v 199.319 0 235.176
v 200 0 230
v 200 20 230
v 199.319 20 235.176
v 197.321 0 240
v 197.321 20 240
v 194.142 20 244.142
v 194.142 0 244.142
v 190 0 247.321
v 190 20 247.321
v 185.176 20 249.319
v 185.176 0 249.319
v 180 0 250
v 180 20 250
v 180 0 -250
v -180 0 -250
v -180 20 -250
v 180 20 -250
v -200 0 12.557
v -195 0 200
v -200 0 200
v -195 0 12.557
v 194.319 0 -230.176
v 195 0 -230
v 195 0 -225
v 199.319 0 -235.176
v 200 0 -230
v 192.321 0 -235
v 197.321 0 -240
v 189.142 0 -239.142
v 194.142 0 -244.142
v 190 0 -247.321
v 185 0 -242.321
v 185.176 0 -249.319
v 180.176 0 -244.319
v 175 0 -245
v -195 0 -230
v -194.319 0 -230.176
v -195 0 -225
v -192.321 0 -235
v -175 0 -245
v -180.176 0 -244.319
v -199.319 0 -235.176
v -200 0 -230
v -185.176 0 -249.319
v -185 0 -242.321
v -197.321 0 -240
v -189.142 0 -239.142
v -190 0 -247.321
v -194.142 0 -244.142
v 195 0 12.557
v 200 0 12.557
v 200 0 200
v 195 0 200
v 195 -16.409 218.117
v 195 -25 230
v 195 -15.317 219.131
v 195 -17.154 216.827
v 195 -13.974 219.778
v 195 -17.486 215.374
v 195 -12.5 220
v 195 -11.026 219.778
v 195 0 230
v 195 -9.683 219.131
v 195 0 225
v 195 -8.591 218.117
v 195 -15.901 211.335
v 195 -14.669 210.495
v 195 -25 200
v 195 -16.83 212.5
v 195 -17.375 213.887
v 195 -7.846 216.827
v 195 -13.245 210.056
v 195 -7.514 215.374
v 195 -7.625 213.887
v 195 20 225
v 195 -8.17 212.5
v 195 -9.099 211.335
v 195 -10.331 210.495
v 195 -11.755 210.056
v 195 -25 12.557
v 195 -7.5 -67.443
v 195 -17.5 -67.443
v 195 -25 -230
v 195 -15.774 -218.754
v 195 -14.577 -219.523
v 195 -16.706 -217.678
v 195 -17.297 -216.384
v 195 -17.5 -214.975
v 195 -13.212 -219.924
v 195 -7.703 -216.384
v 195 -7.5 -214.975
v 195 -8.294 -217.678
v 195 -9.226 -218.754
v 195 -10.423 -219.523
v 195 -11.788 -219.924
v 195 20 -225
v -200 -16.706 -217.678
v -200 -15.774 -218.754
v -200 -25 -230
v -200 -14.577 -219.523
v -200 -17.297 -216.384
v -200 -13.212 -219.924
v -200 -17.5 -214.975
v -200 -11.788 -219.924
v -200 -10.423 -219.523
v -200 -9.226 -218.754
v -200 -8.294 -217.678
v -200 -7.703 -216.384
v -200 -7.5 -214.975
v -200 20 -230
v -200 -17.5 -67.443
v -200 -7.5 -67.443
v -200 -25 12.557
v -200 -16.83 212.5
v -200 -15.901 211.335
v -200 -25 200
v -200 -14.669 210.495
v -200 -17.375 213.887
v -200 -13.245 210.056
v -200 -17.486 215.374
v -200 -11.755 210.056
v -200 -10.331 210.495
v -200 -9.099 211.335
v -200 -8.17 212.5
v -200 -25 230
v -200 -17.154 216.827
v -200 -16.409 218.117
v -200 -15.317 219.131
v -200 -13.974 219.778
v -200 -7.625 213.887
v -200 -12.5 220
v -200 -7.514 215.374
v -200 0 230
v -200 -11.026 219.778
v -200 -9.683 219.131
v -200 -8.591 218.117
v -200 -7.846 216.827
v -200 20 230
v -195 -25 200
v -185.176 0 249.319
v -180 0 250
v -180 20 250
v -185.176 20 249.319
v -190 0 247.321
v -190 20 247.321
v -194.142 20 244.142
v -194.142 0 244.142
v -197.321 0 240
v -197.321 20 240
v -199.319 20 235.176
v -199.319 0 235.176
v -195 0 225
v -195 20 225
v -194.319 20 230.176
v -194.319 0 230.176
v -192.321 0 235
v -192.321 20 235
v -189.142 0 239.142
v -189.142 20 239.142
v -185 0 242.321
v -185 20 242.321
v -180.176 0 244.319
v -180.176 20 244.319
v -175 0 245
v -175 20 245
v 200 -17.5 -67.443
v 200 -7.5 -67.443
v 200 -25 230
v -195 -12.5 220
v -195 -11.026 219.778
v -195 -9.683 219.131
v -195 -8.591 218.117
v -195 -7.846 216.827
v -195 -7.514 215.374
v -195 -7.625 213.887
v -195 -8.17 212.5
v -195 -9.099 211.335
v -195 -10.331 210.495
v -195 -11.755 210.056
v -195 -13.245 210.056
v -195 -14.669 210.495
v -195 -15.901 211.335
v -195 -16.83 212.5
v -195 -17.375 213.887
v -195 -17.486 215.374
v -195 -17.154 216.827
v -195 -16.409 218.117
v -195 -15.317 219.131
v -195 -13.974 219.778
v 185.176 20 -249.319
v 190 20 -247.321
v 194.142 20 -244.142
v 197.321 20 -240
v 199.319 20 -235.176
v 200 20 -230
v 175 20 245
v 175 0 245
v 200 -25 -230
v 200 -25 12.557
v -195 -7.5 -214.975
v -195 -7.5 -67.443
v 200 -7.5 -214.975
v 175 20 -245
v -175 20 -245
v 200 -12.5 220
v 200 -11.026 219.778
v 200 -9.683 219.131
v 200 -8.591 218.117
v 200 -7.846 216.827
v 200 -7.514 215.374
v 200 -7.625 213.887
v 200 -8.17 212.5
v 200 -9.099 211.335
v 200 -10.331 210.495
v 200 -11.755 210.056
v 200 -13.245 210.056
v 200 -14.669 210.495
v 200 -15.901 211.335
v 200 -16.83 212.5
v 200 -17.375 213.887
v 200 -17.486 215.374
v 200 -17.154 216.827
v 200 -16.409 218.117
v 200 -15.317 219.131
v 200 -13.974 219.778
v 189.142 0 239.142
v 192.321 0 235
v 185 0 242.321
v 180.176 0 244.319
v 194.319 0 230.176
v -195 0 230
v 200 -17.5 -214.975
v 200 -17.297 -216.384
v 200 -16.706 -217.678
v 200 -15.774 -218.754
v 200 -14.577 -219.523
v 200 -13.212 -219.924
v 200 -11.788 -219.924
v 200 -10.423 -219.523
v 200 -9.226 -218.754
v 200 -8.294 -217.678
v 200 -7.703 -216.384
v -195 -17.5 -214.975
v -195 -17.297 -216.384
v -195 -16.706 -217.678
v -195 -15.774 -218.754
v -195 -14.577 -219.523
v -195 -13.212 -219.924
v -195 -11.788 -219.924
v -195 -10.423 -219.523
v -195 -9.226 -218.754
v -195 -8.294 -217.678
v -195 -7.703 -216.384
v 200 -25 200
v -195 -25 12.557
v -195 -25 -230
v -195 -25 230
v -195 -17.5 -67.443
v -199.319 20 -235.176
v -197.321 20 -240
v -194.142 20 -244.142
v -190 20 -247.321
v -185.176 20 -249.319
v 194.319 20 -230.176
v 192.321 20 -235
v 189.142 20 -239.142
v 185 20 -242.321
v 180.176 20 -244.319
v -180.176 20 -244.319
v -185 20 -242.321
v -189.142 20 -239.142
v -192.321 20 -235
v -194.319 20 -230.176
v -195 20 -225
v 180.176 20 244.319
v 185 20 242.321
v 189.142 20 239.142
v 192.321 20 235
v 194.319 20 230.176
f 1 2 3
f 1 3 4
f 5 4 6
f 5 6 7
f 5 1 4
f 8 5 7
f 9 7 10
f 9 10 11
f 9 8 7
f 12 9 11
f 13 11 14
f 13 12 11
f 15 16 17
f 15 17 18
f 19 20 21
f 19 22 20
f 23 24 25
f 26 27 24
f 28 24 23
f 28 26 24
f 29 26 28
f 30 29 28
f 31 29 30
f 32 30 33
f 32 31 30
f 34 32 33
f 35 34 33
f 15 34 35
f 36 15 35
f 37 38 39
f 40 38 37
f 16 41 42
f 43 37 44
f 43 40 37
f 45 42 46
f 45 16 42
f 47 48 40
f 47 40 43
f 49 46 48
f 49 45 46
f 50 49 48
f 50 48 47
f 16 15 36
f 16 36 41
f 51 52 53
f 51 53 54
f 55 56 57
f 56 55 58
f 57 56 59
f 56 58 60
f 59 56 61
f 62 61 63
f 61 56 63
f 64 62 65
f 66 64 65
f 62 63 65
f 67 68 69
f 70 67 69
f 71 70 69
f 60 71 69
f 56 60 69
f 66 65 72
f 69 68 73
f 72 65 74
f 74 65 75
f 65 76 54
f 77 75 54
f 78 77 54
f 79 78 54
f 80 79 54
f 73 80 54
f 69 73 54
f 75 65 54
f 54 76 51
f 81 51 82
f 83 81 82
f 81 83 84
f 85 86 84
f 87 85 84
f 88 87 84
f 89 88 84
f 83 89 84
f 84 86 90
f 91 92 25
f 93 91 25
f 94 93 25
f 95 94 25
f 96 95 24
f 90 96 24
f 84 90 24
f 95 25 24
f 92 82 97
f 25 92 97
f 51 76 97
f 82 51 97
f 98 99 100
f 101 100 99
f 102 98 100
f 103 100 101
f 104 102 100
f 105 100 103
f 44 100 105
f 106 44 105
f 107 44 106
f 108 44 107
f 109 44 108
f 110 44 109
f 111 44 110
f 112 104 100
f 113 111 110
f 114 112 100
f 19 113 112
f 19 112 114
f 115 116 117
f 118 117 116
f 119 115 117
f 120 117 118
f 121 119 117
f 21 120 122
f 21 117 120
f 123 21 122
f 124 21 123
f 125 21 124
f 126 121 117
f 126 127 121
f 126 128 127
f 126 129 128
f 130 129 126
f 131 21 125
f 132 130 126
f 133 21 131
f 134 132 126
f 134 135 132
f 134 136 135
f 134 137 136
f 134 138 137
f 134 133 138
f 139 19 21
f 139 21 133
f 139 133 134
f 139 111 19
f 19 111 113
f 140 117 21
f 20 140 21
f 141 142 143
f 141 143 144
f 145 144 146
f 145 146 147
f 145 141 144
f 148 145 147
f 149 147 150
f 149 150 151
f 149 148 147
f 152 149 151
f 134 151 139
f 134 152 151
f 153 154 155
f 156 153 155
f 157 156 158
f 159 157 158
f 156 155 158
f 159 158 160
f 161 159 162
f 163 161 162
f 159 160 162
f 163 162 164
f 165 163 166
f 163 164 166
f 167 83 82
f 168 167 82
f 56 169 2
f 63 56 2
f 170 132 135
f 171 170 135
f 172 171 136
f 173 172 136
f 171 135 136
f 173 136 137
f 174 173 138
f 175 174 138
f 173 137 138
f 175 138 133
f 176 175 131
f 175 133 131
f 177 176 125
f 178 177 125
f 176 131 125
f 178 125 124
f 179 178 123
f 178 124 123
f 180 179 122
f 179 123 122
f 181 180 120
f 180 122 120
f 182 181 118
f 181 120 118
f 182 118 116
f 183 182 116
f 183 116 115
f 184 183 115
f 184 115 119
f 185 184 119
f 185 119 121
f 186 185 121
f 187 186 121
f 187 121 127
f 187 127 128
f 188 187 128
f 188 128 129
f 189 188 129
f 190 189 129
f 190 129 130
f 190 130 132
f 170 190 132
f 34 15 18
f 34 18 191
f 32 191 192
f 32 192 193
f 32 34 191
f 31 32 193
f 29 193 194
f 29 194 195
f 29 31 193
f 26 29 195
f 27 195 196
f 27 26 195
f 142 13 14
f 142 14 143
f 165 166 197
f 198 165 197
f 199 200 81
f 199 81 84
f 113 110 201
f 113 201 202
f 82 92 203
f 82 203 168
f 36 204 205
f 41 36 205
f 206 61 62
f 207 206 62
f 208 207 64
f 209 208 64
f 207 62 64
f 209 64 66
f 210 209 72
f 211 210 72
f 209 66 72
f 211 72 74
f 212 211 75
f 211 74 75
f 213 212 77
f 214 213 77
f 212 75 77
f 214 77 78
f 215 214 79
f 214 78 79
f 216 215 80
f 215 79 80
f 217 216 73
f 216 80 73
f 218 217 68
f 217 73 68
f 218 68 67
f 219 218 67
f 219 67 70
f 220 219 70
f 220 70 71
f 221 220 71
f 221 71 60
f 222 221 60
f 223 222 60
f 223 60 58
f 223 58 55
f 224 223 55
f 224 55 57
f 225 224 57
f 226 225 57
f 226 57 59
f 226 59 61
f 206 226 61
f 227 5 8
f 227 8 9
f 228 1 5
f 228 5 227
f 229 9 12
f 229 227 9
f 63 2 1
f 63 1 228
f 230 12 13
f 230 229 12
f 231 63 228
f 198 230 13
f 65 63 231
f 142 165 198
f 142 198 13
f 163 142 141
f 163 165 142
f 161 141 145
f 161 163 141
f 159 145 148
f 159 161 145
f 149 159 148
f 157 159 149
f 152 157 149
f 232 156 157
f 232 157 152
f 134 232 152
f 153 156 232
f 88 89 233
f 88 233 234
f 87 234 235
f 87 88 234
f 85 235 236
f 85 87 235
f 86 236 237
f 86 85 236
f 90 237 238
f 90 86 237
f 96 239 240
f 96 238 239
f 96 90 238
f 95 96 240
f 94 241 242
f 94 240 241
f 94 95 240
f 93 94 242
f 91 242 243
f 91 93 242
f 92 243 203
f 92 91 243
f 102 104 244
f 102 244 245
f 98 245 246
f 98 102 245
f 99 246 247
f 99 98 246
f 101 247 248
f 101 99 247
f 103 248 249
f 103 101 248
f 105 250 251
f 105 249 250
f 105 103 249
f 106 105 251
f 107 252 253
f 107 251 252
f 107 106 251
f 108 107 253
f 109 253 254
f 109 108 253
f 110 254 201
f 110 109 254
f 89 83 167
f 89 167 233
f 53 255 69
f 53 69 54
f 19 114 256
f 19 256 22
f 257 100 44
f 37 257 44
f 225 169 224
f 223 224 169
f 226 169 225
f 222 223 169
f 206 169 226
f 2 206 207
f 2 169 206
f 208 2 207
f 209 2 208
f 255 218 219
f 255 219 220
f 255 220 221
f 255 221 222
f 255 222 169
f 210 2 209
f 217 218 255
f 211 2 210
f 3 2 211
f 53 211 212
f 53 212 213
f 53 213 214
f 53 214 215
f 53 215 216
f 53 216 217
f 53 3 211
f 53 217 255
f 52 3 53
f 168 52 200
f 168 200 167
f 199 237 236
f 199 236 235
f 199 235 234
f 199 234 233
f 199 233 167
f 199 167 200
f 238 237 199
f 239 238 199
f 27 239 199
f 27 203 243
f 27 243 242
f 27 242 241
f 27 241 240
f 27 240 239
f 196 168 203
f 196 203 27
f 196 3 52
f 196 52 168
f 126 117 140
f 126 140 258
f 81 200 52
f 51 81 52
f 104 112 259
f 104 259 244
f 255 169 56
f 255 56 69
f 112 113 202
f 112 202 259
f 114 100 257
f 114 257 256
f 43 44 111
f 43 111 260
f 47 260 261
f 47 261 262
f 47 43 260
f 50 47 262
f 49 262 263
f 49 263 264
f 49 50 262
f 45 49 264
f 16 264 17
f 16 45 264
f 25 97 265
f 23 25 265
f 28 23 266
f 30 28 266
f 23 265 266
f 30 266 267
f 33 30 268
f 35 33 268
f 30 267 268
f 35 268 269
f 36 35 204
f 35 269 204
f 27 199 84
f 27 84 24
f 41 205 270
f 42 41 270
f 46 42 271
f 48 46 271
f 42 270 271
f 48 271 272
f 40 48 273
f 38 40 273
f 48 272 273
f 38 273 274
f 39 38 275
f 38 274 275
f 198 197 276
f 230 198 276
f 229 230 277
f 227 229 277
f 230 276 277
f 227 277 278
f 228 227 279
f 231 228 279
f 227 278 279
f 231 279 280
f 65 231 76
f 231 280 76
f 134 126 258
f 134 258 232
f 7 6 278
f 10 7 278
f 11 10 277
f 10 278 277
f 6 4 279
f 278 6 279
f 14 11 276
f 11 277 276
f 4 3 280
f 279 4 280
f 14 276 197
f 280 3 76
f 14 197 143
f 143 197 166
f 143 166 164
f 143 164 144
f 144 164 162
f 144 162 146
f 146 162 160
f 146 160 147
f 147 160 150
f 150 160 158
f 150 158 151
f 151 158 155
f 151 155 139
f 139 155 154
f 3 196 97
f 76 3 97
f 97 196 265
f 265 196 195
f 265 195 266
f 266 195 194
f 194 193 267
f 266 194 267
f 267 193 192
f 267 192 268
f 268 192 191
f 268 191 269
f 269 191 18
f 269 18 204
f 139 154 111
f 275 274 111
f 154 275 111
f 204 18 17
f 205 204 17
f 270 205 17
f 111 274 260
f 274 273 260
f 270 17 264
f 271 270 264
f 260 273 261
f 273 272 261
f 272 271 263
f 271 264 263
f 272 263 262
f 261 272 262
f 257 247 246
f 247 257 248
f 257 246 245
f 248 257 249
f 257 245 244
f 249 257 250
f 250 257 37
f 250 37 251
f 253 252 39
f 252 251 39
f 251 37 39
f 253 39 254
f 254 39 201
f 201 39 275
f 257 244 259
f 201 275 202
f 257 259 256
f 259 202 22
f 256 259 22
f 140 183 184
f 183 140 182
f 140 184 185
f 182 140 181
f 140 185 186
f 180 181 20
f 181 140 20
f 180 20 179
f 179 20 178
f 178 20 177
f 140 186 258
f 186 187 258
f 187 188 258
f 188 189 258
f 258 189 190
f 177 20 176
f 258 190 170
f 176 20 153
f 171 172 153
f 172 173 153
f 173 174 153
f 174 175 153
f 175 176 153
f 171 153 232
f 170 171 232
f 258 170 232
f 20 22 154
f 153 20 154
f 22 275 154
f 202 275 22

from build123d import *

# Parameters (mm, degrees)
BOSS_EXTRUDE2_DEPTH     = 20
CUT_EXTRUDE1_DEPTH      = 20
SKETCH7_W               = 242.556539121
SKETCH7_H               = 25
BOSS_EXTRUDE3_DEPTH     = 5
SKETCH8_W               = 242.556539121
SKETCH8_H               = 25
BOSS_EXTRUDE4_DEPTH     = 5
CUT_EXTRUDE2_DEPTH      = 473.361090692
CUT_EXTRUDE2_DEPTH_BACK = 473.361090692
SKETCH11_W              = 30
SKETCH11_H              = 25
BOSS_EXTRUDE5_DEPTH     = 5
SKETCH13_W              = 30
SKETCH13_H              = 25
BOSS_EXTRUDE6_DEPTH     = 5
SKETCH14_R              = 5
CUT_EXTRUDE3_DEPTH      = 473.361090692
BOSS_EXTRUDE7_DEPTH     = 5
BOSS_EXTRUDE8_START     = -5
BOSS_EXTRUDE8_DEPTH     = 5


with BuildPart() as part:
    # Sketch5 → Boss-Extrude2 (new body)
    with BuildSketch(Plane(origin=(0, 0, 0), x_dir=(1, 0, 0), z_dir=(0, 1, 0))):
        with BuildLine():
            Line((-180, 250), (180, 250))
            ThreePointArc((180, 250), (194.142135624, 244.142135624), (200, 230))
            Line((200, 230), (200, -230))
            ThreePointArc((200, -230), (194.142135624, -244.142135624), (180, -250))
            Line((180, -250), (-180, -250))
            ThreePointArc((-180, -250), (-194.142135624, -244.142135624), (-200, -230))
            Line((-200, -230), (-200, 230))
            ThreePointArc((-200, 230), (-194.142135624, 244.142135624), (-180, 250))
        make_face()
    extrude(amount=BOSS_EXTRUDE2_DEPTH)

    # Sketch6 → Cut-Extrude1 (cut)
    with BuildSketch(Plane(origin=(0, 20, 0), x_dir=(1, 0, 0), z_dir=(0, 1, 0))):
        with BuildLine():
            Line((-175, -245), (175, -245))
            ThreePointArc((175, -245), (189.142135624, -239.142135624), (195, -225))
            Line((195, -225), (195, 225))
            ThreePointArc((195, 225), (189.142135624, 239.142135624), (175, 245))
            Line((175, 245), (-175, 245))
            ThreePointArc((-175, 245), (-189.142135624, 239.142135624), (-195, 225))
            Line((-195, 225), (-195, -225))
            ThreePointArc((-195, -225), (-189.142135624, -239.142135624), (-175, -245))
        make_face()
    extrude(amount=-CUT_EXTRUDE1_DEPTH, mode=Mode.SUBTRACT)

    # Sketch7 → Boss-Extrude3 (add)
    with BuildSketch(Plane(origin=(200, 0, 0), x_dir=(0, 0, -1), z_dir=(1, 0, 0))):
        with Locations((108.72173044, -12.5)):
            Rectangle(SKETCH7_W, SKETCH7_H)
    extrude(amount=-BOSS_EXTRUDE3_DEPTH)

    # Sketch8 → Boss-Extrude4 (add)
    with BuildSketch(Plane.ZY.offset(200)):
        with Locations((-108.72173044, -12.5)):
            Rectangle(SKETCH8_W, SKETCH8_H)
    extrude(amount=-BOSS_EXTRUDE4_DEPTH)

    # Sketch10 → Cut-Extrude2 (cut, two sides: drawn at the far end of the back side and taken through both)
    with BuildSketch(Plane(origin=(200, 0, 0), x_dir=(0, 0, -1), z_dir=(1, 0, 0)).offset(-CUT_EXTRUDE2_DEPTH_BACK)):
        with BuildLine():
            Line((214.975112076, -7.5), (2.443460879, -7.5))
            ThreePointArc((2.443460879, -7.5), (-2.556539121, -12.5), (2.443460879, -17.5))
            Line((2.443460879, -17.5), (214.975112076, -17.5))
            ThreePointArc((214.975112076, -17.5), (219.975112076, -12.5), (214.975112076, -7.5))
        make_face()
    extrude(amount=CUT_EXTRUDE2_DEPTH + CUT_EXTRUDE2_DEPTH_BACK, mode=Mode.SUBTRACT)

    # Sketch11 → Boss-Extrude5 (add)
    with BuildSketch(Plane(origin=(200, 0, 0), x_dir=(0, 0, -1), z_dir=(1, 0, 0))):
        with Locations((-215, -12.5)):
            Rectangle(SKETCH11_W, SKETCH11_H)
    extrude(amount=-BOSS_EXTRUDE5_DEPTH)

    # Sketch13 → Boss-Extrude6 (add)
    with BuildSketch(Plane.ZY.offset(200)):
        with Locations((215, -12.5)):
            Rectangle(SKETCH13_W, SKETCH13_H)
    extrude(amount=-BOSS_EXTRUDE6_DEPTH)

    # Sketch14 → Cut-Extrude3 (cut, through all)
    with BuildSketch(Plane.ZY.offset(200)):
        with Locations((215, -12.5)):
            Circle(SKETCH14_R)
    extrude(amount=-CUT_EXTRUDE3_DEPTH, mode=Mode.SUBTRACT)

    # Sketch16 → Boss-Extrude7 (add)
    with BuildSketch(Plane.ZY.offset(200)):
        with BuildLine():
            Line((-67.443460879, -17.5), (-2.443460879, -17.5))
            ThreePointArc((-2.443460879, -17.5), (2.556539121, -12.5), (-2.443460879, -7.5))
            Line((-2.443460879, -7.5), (-67.443460879, -7.5))
            Line((-67.443460879, -7.5), (-67.443460879, -17.5))
        make_face()
    extrude(amount=-BOSS_EXTRUDE7_DEPTH)

    # Sketch17 → Boss-Extrude8 (add)
    with BuildSketch(Plane(origin=(200, 0, 0), x_dir=(0, 0, -1), z_dir=(1, 0, 0)).offset(BOSS_EXTRUDE8_START)):
        with BuildLine():
            Line((67.443460879, -17.5), (67.443460879, -7.5))
            Line((67.443460879, -7.5), (2.443460879, -7.5))
            ThreePointArc((2.443460879, -7.5), (-2.556539121, -12.5), (2.443460879, -17.5))
            Line((2.443460879, -17.5), (67.443460879, -17.5))
        make_face()
    extrude(amount=BOSS_EXTRUDE8_DEPTH)


solid = part.part
